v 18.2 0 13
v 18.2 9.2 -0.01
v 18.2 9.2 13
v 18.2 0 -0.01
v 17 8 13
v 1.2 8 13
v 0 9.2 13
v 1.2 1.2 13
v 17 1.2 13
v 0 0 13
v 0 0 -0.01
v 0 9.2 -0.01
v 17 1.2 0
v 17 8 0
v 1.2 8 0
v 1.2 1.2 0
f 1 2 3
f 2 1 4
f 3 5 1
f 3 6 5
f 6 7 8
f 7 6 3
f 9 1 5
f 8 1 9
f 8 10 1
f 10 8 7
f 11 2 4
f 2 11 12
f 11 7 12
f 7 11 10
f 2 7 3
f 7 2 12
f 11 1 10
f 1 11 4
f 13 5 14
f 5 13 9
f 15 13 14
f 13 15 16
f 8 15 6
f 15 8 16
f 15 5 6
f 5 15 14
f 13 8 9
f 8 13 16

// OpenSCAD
// file: ../Base/Boxes.scad
// Fischertechnik Box Foundation
// Pre-designed Boxes

use <Constants.scad>

include <PlacementOptions.scad>

box190Width = 190;
box190Depth = 130;
box130Width = 130;
box130Depth = 95;
boxUsageHeight = 33.9;
boxWallThickness = 2.4;
boxBaseThickness = 1.0;

// getBoxWallThickness()
// Gets the wall thickness of a Fischertechnik Box

function getBoxWallThickness() = boxWallThickness;

// Gets the usable height of a fischertechnik box
function getBoxUsageHeight() = boxUsageHeight;

// Gets the thickness of the Fischertechnik box base.
function getBoxBaseThickness() = boxBaseThickness;

// Gets the usable inner space of a Box 190 as an x/y-list
function getBox190Space() = [
    box190Width - 2*getBoxWallThickness(), 
    box190Depth - 2*getBoxWallThickness() ];

// Imports the Fischertechnik empty box 130x190 mm and places it at position 0,0
// 190x130 are the outer sizes, the inner space is slightly smaller. Use getBox190Space() to get the inner sizes.
// This module needs the STL file "Fischertechnik Box 130x190.stl" in the library path.
// The box is positioned that the usable inner space is at the 0,0,0 position. The

module Box190() {
    translate([-getBoxWallThickness(),-getBoxWallThickness(),-getBoxBaseThickness()])
        import("Fischertechnik Box 130x190.stl", convexity=3);
}

// Gets the usable inner space of a Box 130 as an x/y-list
function getBox130Space() = [
    box130Width - 2*getBoxWallThickness(), 
    box130Depth - 2*getBoxWallThickness() ];

// Imports the Fischertechnik empty box 95x130 mm and places it at position 0,0
// 190x130 are the outer sizes, the inner space is slightly smaller. Use getBox190Space() to get the inner sizes.
// This module needs the STL file "Fischertechnik Box 95x130.stl" in the library path.
// The box is positioned that the usable inner space is at the 0,0,0 position. The

module Box130() {
    translate([-getBoxWallThickness(),-getBoxWallThickness(),-getBoxBaseThickness()])
        import("Fischertechnik Box 95x130.stl", convexity=3);
}

// Creates a web at the specified box walls
// corner 0 = LowerLeft, 1 = UpperLeft, 2 = UpperRight, 3 = LowerRight
// side 0 = LeftOfCorner, 1 = RightOfCorner
// distance = Distance in mm from the corner
// box = inner width and depth of the box (default: Box 190)
// webWidth = length of the web (default is 3 mms)
// webThickness = thickness of the web (default is 1 mm)

module BoxWeb(corner, side, distance, box=getBox190Space(), webWidth=3, webThickness=1.0) {
    sink = getBoxWallThickness()/2;

    width = (corner % 2 == 0) ? 
            (side == LeftOfCorner ? webWidth : webThickness) :
            (side == LeftOfCorner ? webThickness : webWidth);

    depth = (corner % 2 == 0) ? 
            (side == RightOfCorner ? webWidth : webThickness) :
            (side == RightOfCorner ? webThickness : webWidth);
    
    xDiff = corner == LowerLeft ? 
                (side == LeftOfCorner ? -sink : distance) :
            (corner == UpperLeft ?                
                (side == LeftOfCorner ? distance : -sink) :
            (corner == UpperRight ?
                (side == LeftOfCorner ? box.x-webWidth+sink : box.x-distance-webThickness) :
                (side == LeftOfCorner ? box.x-distance-webThickness: box.x-webWidth+sink)));

    yDiff = corner == LowerLeft ? 
                (side == RightOfCorner ? -sink : distance) :
            (corner == UpperLeft ?
                (side == RightOfCorner ? box.y-distance : box.y-webWidth+sink) :
            (corner == UpperRight ?
                (side == RightOfCorner ? box.y-webWidth+sink : box.y-distance) :
                (side == RightOfCorner ? distance : -sink)));
    
    translate([xDiff, yDiff, -getExcess()])
        cube([width, depth, boxUsageHeight + 2*getExcess()]);
}
// file: ../Base/Rotation.scad
// Fischertechnik Box Foundation
// Geometry Helpers Rotation

include <PlacementOptions.scad>

// getRotatedSpace(space, rotation=NoRotation)
// Rotates the space dependent on the specified rotation

function getRotatedSpace(space, rotation=NoRotation) = [
    (rotation == Rotate90 || rotation == Rotate270) ? space.y : space.x,
    (rotation == Rotate90 || rotation == Rotate270) ? space.x : space.y
];

// Rotates the given space around the fixed left lower corner
// space = the space the children needs as width/depth list [width,depth]
// rotation = 0 Rotate0 degrees, 1 Rotate90 degrees, 2 Rotate180 degrees, 3 Rotate270 degrees (equivalent to -90)

module RotateFix(space, rotation=Rotate0) {
    dy = (rotation == Rotate0 || rotation == Rotate270) ? 0 :
        (rotation == Rotate90) ? space.x :
        space.y;
    dx = (rotation < Rotate180) ? 0 :
        (rotation == Rotate180) ? space.x :
        space.y;
    
    translate([dx, dy, 0])
        rotate([0, 0, rotations[rotation]])
            children();
}
// file: ../Base/Alignment.scad
// Fischertechnik Box Foundation
// Geometry Helpers Alignment

include <PlacementOptions.scad>

// getAlignedX(elementWidth, spaceWidth, align=AlignRight, offset=0)
// Gets the aligned X offset of an element with the given
// width in the given space.
// elementWidth = The width of the element to positon
// spaceWidth = The space where the element should be aligned
// align = 0 AlignLeft, 1 AlignCenter, 2 AlignRight
// offset = an optional offset from the aligned position. When
// aligned left or centered, then positive values are in X direction.
// When aligned right then positive values are in negative X direction.

function getAlignedX(elementWidth, spaceWidth, align=AlignRight, offset=0) =
    (align == AlignLeft) ?
        offset :
        ((align == AlignCenter) ?
        (spaceWidth - elementWidth)/2 + offset :
        spaceWidth - offset - elementWidth);

// getAlignedY(elementDepth, spaceDepth, align=AlignTop, offset=0)
// Gets the aligned Y offset of an element with the given
// depth in the given space.
// elementDepth = The depth of the element to positon
// spaceDepth = The space where the element should be aligned
// align = 0 AlignBottom, 1 AlignCenter, 2 AlignTop
// offset = an optional offset from the aligned position. When
// aligned bottom or centered, then positive values are in Y direction.
// When aligned top then positive values are in negative Y direction.

function getAlignedY(elementDepth, spaceDepth, align=AlignTop, offset=0) =
    (align == AlignBottom) ?
        offset :
        ((align == AlignCenter) ?
        (spaceDepth - elementDepth)/2 + offset :
        spaceDepth - offset - elementDepth);
// file: ../Base/PlacementOptions.scad
// Fischertechnik Box Foundation
// Placement Options

// Alignment
NoAlign = 0;
AlignLeft = 1;
AlignBottom = 2;
AlignCenter = 3;
AlignRight = 4;
AlignTop = 5;

// Element rotation degree steps
rotations = [0, -90, -180, -270];

// Rotation
NoRotation = 0;
Rotate0 = 0;
Rotate90 = 1;
Rotate180 = 2;
Rotate270 = 3;

// Docking (seen from above)
NoDock = -1;
DockLeft = 0;
DockTop = 1;
DockRight = 2;
DockCorner = 2;
DockBottom = 3;

// Web corners
LowerLeft = 0;
UpperLeft = 1;
UpperRight = 2;
LowerRight = 3;

// Web position relative to corner
LeftOfCorner = 0;
RightOfCorner = 1;
// file: ../Base/Placement.scad
// Fischertechnik Box Foundation
// Geometry Helpers Placement

use <Constants.scad>
use <Alignment.scad>
use <Rotation.scad>
use <Boxes.scad>

include <PlacementOptions.scad>

// Place(x=0, y=0, elementSpace=[0,0], alignX=AlignLeft, alignY=AlignBottom, rotation=Rotate0, boxSpace=getBox190Space())
// Places the child at the specified position
// y = Y-Position. This is a relative position when an X aligment is specified.
// x = X-Position. This is a relative position when an Y aligment is specified.
// elementSpace = space of the element to be placed [x,y]
// alignX = -1=NoAlign, 0 AlignLeft, 1 AlignCenter, 3 AlignRight (elementSpace and boxSpace required!)
// alignY = -1=NoAlign, 2 AlignBottom, 1 AlignCenter, 4 AlignTop (elementSpace and boxSpace required!)
// rotation = 0 Rotate0 0 degrees, 1 Rotate90 90 degrees, 
// 2 Rotate180 180 degrees, 3 Rotate270 270 degrees (equivalent to -90)
// boxSpace = Inner space of the box where the placement occurs [x,y] - default is Box 190x130 inner space

module Place(x=0, y=0, elementSpace=[0,0], 
  alignX=AlignLeft, alignY=AlignBottom, 
  rotation=NoRotation, boxSpace=getBox190Space()) {

    module Position(x, y, space, rotation=Rotate0) {
        translate([x, y, 0])
            RotateFix(space, rotation)
                children(0);
    }

    space = getRotatedSpace(elementSpace, rotation);
    alignedX = getAlignedX(space.x, boxSpace.x, alignX, x);
    alignedY = getAlignedY(space.y, boxSpace.y, alignY, y);
    Position(alignedX, alignedY, elementSpace, rotation)
        children(0);
}

// Center(space=getBox130Space(), elementSpace=[0,0])
// space = Space where the children is centered. For cylinder use centered=true and no elementSpace.
// elementSpace = space of the element to be centered [x,y]

module Center(space=getBox190Space(), elementSpace=[0,0]) {
    translate([(space.x - elementSpace.x) / 2, (space.y - elementSpace.y) / 2])
        children(0);
}

// CenterHorizontal(width=0, y=0, offset=0, space=getBox130Space())
// space = Space where the children is centered. For cylinder use centered=true and no elementSpace.
// elementSpace = space of the element to be centered [x,y]

module CenterHorizontal(width=0, y=0, offset=0, space=getBox190Space()) {
    translate([(space.x - width) / 2 + offset, y])
        children(0);
}

// CenterVertical(depth=0, x=0, offset=0, space=getBox130Space())
// space = Space where the children is centered. For cylinder use centered=true and no elementSpace.
// elementSpace = space of the element to be centered [x,y]

module CenterVerticalal(depth=0, x=0, offset=0, space=getBox190Space()) {
    translate([x, (space.y - depth) / 2 + offset])
        children(0);
}
// file: ../Base/Constants.scad
// Fischertechnik Box Foundation
// Constants

// Constant values necessary for multiple elements

// Base constants
dividerThickness = 1.2;
excess = 0.01;
fragments = 90;
tolerance = 0.8;

// Gets the thickness of a divider 
function getDividerThickness() = dividerThickness;

// Gets the excess that is used to merge walls into each other
function getExcess() = excess;

// Gets amount of fragments of a cylinder
function getFragments() = fragments;

// Gets the inner tolerance of a frame to each side
function getTolerance() = tolerance;


// Fischertechnik specific constants
axisDiameter = 4;
axisBottomDiameter = axisDiameter + 1;
standardEdgeDistance = 2.5;
standardWebDistance = 11.5;
standardCornerLength = 15;
tubeWallFactor = 1.6;

// Gets axis diameter
function getAxisDiameter() = axisDiameter;

// Gets axis bottom diameter for thicker part at the bottom
function getAxisBottomDiameter() = axisBottomDiameter;

// gets the standard distance to the wall of the box for dockable frames with webs
function getStandardEdgeDistance() = standardEdgeDistance;

// gets the standard distance of each web to the corner of the dockable frame
function getStandardWebDistance() = standardWebDistance;

// gets the standard length of the corner walls of a dockable frame
function getStandardCornerLength() = standardCornerLength;

// gets the wall thickness of a tube.
function getTubeWallThickness() = tubeWallFactor * getDividerThickness();
// main file
// Fischertechnik Box Library
// Frame for Plugged Capacitor (two plugs)
// 36387

use <../ModelBase/Simple.scad>

width = 15;
depth = 6;
height = 13;

// getFramePluggedCapacitorSpace()
// Gets the space the frame for a plugged capacitor needs as width and depth (.x and .y as a list)

function getFramePluggedCapacitorSpace() = getFrameOuterVolume([width, depth, height]);

// FramePluggedCapacitor()
// The walls of the frame are 13 mm high. 
// The complete frame has a tolerance of addition 1 mm in each direction.

module FramePluggedCapacitor() {
    Frame([width, depth, height]);
}

// Tests
color("lightgray") {
FramePluggedCapacitor();
}
